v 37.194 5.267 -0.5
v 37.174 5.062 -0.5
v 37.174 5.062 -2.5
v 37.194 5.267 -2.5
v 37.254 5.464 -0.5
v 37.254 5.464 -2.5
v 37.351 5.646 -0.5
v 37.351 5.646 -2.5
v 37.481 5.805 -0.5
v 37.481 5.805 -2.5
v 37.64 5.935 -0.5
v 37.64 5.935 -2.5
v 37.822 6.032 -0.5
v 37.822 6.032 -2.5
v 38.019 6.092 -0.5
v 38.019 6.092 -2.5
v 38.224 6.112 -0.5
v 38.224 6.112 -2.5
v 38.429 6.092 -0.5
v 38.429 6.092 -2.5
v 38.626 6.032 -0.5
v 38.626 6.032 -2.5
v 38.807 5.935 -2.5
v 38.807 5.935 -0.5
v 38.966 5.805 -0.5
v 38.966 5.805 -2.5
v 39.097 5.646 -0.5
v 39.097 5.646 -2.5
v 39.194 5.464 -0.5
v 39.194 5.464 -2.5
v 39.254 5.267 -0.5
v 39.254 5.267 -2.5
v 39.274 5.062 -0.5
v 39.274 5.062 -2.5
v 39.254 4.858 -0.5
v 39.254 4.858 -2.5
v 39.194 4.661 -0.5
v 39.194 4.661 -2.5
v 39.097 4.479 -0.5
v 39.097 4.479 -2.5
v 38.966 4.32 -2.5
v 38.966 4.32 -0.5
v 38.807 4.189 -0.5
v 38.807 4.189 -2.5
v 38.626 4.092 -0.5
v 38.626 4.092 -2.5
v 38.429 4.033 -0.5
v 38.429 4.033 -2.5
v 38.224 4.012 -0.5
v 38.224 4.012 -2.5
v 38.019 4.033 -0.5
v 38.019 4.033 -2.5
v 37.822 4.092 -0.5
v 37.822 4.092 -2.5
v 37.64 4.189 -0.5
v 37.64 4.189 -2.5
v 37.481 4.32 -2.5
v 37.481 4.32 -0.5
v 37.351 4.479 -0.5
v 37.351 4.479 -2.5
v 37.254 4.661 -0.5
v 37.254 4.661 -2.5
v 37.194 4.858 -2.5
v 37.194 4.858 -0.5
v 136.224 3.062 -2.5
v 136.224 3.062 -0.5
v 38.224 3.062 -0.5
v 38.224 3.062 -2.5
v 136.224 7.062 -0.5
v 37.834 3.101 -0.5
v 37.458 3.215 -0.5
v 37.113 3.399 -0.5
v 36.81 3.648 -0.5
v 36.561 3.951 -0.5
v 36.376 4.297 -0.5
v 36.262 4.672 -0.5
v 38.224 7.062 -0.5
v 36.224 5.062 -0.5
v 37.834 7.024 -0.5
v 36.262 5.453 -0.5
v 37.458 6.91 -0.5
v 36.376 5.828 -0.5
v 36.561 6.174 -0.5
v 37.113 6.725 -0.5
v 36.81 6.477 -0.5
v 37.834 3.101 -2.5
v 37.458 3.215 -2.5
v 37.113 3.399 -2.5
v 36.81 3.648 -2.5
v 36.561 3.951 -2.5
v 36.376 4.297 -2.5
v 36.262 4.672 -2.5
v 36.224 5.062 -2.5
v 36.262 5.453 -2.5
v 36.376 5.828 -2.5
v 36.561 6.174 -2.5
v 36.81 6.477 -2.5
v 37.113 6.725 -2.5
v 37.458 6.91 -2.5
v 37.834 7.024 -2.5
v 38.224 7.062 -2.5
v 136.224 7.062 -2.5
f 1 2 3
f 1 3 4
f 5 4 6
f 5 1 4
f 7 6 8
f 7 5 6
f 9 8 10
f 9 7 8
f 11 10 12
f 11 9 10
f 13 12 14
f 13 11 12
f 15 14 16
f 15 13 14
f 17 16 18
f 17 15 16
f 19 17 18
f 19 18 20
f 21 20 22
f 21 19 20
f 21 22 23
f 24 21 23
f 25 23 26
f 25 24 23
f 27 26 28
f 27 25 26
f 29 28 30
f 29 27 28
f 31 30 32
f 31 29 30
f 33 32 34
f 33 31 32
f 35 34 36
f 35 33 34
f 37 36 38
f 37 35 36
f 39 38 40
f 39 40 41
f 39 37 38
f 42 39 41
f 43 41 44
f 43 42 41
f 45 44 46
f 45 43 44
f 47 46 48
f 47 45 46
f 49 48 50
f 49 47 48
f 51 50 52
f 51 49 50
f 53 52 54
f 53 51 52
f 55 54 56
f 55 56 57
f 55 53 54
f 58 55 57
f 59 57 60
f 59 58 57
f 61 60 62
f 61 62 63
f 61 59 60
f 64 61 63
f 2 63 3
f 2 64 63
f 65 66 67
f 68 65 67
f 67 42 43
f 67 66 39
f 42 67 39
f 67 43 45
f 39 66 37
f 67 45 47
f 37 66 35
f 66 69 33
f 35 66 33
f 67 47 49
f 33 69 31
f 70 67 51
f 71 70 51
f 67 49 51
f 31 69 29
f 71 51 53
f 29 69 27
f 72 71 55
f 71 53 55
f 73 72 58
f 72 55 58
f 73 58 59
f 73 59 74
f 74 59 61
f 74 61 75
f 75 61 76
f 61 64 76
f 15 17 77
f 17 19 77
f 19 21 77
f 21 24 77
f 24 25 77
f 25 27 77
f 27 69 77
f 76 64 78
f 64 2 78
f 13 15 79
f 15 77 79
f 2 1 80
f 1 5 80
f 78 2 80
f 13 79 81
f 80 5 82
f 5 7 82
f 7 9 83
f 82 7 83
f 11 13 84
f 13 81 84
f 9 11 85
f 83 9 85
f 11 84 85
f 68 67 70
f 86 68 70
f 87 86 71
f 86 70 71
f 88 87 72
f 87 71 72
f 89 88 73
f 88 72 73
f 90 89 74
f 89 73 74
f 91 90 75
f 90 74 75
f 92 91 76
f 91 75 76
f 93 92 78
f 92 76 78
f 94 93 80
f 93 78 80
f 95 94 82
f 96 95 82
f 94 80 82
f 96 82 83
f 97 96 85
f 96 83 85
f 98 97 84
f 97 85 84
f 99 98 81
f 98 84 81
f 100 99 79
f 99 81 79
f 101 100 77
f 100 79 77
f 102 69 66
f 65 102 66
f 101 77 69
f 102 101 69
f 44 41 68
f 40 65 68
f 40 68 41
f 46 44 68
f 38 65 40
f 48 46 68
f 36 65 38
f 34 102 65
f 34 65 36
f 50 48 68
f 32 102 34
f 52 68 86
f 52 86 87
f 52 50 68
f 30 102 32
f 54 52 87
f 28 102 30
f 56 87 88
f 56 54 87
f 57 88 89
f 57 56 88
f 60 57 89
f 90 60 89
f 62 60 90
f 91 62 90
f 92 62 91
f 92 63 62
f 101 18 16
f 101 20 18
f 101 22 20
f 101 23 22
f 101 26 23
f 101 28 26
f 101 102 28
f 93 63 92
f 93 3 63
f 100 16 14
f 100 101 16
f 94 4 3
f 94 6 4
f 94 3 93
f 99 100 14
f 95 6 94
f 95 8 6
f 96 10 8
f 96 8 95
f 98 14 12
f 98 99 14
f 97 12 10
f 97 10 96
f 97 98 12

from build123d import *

# Parameters (mm, degrees)
EXTRUDE_1_DEPTH      = 0.5
EXTRUDE_1_DEPTH_BACK = 0.5
SKETCH_1_W           = 100
SKETCH_1_H           = 20
CUT_EXTRUDE_1_DEPTH  = 52
SKETCH_8_R           = 1.5
CUT_EXTRUDE_2_DEPTH  = 52.00000012
SKETCH_9_R           = 1.05
EXTRUDE_2_DEPTH      = 2
OTHER_START          = -0.5
OTHER_1_OUTLINE_W    = 100
OTHER_1_OUTLINE_H    = 20
OTHER_1_OUTLINE_R    = 1.5
OTHER_1_DEPTH        = 1


# Read off the part's stored shape, not the designer's step: Пересечение1
with BuildPart() as part:
    # Эскиз1 → Бобышка-Вытянуть1 (new, two sides: drawn at the far end of the back side and taken through both)
    with BuildSketch(Plane.XY.offset(-EXTRUDE_1_DEPTH_BACK)):
        Rectangle(SKETCH_1_W, SKETCH_1_H)
    extrude(amount=EXTRUDE_1_DEPTH + EXTRUDE_1_DEPTH_BACK)

    # Эскиз7 → Вырез-Вытянуть1 (cut, through all)
    with BuildSketch(Plane.XY.offset(0.5)):
        with BuildLine():
            ThreePointArc((37.261495637, 5.33423095), (37.952030231, 4.100066466), (39.186194715, 4.79060106))
            add(Edge.make_bspline(
                [(39.186194715, 4.79060106), (39.206075717, 4.860988923), (39.262496645, 4.988405972), (39.480772307, 5.263607744), (39.972116976, 5.552949613), (40.89012751, 5.611168859), (42.346211172, 5.064723366), (44.026902125, 2.933159087), (43.815557835, -1.408653234), (40.817030581, -4.80884968), (37.021062322, -6.164885186), (33.732157303, -6.253240822), (30.314099065, -5.243442536), (27.144697082, -3.082909818), (25.035720973, -0.378766084), (23.85308145, 2.208270108), (23.449186454, 3.64108751), (23.305322842, 4.359662985)],
                knots=[0, 0, 0, 0, 0.03125, 0.0625, 0.125, 0.1875, 0.25, 0.375, 0.5, 0.625, 0.6875, 0.75, 0.8125, 0.875, 0.9375, 0.96875, 1, 1, 1, 1], degree=3))
            ThreePointArc((23.305322842, 4.359662985), (22.128470162, 5.143893671), (21.344239476, 3.96704099))
            add(Edge.make_bspline(
                [(37.261495637, 5.33423095), (37.539855307, 6.319751815), (39.275153501, 7.946538331), (43.246471825, 7.317604488), (46.129826318, 3.464099405), (45.771597181, -2.30217859), (41.988507816, -6.528062966), (37.380831362, -8.166298308), (33.454677533, -8.267248255), (29.431863805, -7.074452826), (25.746418814, -4.55740521), (23.320064013, -1.441995451), (21.967408891, 1.518598896), (21.5081203, 3.148482776), (21.344239476, 3.96704099)],
                knots=[0, 0, 0, 0, 0.125, 0.25, 0.375, 0.5, 0.625, 0.6875, 0.75, 0.8125, 0.875, 0.9375, 0.96875, 1, 1, 1, 1], degree=3))
        make_face()
    extrude(amount=-CUT_EXTRUDE_1_DEPTH, mode=Mode.SUBTRACT)

    # Эскиз8 → Вырез-Вытянуть2 (cut, through all)
    with BuildSketch(Plane(origin=(0, 0, -0.5), x_dir=(-1, 0, 0), z_dir=(0, 0, -1))):
        with Locations((-40.392058098, 0)):
            Circle(SKETCH_8_R)
    cut_extrude_2 = extrude(amount=-CUT_EXTRUDE_2_DEPTH, mode=Mode.SUBTRACT)

    # Зеркальное отражение1: Вырез-Вытянуть2 across plane
    add(cut_extrude_2.mirror(Plane(origin=(0, 0, 0), x_dir=(0, 0, 1), z_dir=(1, 0, 0))), mode=Mode.SUBTRACT)

    # Пересечение1 outline → Пересечение1 (cut)
    with BuildSketch(Plane.XY.offset(OTHER_START)):
        Rectangle(OTHER_1_OUTLINE_W, OTHER_1_OUTLINE_H)
        with BuildLine():
            add(Edge.make_bspline(
                [(21.344239476, 3.96704099), (21.5081203, 3.148482776), (21.967408891, 1.518598896), (23.320064013, -1.441995451), (25.746418814, -4.55740521), (29.431863805, -7.074452826), (33.454677533, -8.267248255), (37.380831362, -8.166298308), (41.988507816, -6.528062966), (45.771597181, -2.30217859), (46.129826318, 3.464099405), (43.246471825, 7.317604488), (39.275153501, 7.946538331), (37.539855307, 6.319751815), (37.261495637, 5.33423095)],
                knots=[0, 0, 0, 0, 0.03125, 0.0625, 0.125, 0.1875, 0.25, 0.3125, 0.375, 0.5, 0.625, 0.75, 0.875, 1, 1, 1, 1], degree=3))
            ThreePointArc((21.344239476, 3.96704099), (22.128470161, 5.143893671), (23.305322842, 4.359662985))
            add(Edge.make_bspline(
                [(39.186194715, 4.79060106), (39.206075717, 4.860988923), (39.262496645, 4.988405972), (39.480772307, 5.263607744), (39.972116976, 5.552949613), (40.89012751, 5.611168859), (42.346211172, 5.064723366), (44.026902125, 2.933159087), (43.815557835, -1.408653234), (40.817030581, -4.80884968), (37.021062322, -6.164885186), (33.732157303, -6.253240822), (30.314099065, -5.243442536), (27.144697082, -3.082909818), (25.035720973, -0.378766084), (23.85308145, 2.208270108), (23.449186454, 3.64108751), (23.305322842, 4.359662985)],
                knots=[0, 0, 0, 0, 0.03125, 0.0625, 0.125, 0.1875, 0.25, 0.375, 0.5, 0.625, 0.6875, 0.75, 0.8125, 0.875, 0.9375, 0.96875, 1, 1, 1, 1], degree=3))
            ThreePointArc((39.186194715, 4.79060106), (37.952030231, 4.100066466), (37.261495637, 5.33423095))
        make_face(mode=Mode.SUBTRACT)
        with Locations((-40.392058098, 0)):
            Circle(OTHER_1_OUTLINE_R, mode=Mode.SUBTRACT)
        with Locations((40.392058098, 0)):
            Circle(OTHER_1_OUTLINE_R, mode=Mode.SUBTRACT)
    extrude(amount=OTHER_1_DEPTH, mode=Mode.SUBTRACT)


with BuildPart() as body_2:
    # Эскиз9 → Бобышка-Вытянуть2 (new body)
    with BuildSketch(Plane(origin=(0, 0, -0.5), x_dir=(-1, 0, 0), z_dir=(0, 0, -1))):
        with BuildLine():
            Line((-38.223845176, 7.062416005), (-136.223845176, 7.062416005))
            Line((-136.223845176, 7.062416005), (-136.223845176, 3.062416005))
            Line((-136.223845176, 3.062416005), (-38.223845176, 3.062416005))
            ThreePointArc((-38.223845176, 3.062416005), (-36.223845176, 5.062416005), (-38.223845176, 7.062416005))
        make_face()
        with Locations((-38.223845176, 5.062416005)):
            Circle(SKETCH_9_R, mode=Mode.SUBTRACT)
    extrude(amount=EXTRUDE_2_DEPTH)


solid = body_2.part
